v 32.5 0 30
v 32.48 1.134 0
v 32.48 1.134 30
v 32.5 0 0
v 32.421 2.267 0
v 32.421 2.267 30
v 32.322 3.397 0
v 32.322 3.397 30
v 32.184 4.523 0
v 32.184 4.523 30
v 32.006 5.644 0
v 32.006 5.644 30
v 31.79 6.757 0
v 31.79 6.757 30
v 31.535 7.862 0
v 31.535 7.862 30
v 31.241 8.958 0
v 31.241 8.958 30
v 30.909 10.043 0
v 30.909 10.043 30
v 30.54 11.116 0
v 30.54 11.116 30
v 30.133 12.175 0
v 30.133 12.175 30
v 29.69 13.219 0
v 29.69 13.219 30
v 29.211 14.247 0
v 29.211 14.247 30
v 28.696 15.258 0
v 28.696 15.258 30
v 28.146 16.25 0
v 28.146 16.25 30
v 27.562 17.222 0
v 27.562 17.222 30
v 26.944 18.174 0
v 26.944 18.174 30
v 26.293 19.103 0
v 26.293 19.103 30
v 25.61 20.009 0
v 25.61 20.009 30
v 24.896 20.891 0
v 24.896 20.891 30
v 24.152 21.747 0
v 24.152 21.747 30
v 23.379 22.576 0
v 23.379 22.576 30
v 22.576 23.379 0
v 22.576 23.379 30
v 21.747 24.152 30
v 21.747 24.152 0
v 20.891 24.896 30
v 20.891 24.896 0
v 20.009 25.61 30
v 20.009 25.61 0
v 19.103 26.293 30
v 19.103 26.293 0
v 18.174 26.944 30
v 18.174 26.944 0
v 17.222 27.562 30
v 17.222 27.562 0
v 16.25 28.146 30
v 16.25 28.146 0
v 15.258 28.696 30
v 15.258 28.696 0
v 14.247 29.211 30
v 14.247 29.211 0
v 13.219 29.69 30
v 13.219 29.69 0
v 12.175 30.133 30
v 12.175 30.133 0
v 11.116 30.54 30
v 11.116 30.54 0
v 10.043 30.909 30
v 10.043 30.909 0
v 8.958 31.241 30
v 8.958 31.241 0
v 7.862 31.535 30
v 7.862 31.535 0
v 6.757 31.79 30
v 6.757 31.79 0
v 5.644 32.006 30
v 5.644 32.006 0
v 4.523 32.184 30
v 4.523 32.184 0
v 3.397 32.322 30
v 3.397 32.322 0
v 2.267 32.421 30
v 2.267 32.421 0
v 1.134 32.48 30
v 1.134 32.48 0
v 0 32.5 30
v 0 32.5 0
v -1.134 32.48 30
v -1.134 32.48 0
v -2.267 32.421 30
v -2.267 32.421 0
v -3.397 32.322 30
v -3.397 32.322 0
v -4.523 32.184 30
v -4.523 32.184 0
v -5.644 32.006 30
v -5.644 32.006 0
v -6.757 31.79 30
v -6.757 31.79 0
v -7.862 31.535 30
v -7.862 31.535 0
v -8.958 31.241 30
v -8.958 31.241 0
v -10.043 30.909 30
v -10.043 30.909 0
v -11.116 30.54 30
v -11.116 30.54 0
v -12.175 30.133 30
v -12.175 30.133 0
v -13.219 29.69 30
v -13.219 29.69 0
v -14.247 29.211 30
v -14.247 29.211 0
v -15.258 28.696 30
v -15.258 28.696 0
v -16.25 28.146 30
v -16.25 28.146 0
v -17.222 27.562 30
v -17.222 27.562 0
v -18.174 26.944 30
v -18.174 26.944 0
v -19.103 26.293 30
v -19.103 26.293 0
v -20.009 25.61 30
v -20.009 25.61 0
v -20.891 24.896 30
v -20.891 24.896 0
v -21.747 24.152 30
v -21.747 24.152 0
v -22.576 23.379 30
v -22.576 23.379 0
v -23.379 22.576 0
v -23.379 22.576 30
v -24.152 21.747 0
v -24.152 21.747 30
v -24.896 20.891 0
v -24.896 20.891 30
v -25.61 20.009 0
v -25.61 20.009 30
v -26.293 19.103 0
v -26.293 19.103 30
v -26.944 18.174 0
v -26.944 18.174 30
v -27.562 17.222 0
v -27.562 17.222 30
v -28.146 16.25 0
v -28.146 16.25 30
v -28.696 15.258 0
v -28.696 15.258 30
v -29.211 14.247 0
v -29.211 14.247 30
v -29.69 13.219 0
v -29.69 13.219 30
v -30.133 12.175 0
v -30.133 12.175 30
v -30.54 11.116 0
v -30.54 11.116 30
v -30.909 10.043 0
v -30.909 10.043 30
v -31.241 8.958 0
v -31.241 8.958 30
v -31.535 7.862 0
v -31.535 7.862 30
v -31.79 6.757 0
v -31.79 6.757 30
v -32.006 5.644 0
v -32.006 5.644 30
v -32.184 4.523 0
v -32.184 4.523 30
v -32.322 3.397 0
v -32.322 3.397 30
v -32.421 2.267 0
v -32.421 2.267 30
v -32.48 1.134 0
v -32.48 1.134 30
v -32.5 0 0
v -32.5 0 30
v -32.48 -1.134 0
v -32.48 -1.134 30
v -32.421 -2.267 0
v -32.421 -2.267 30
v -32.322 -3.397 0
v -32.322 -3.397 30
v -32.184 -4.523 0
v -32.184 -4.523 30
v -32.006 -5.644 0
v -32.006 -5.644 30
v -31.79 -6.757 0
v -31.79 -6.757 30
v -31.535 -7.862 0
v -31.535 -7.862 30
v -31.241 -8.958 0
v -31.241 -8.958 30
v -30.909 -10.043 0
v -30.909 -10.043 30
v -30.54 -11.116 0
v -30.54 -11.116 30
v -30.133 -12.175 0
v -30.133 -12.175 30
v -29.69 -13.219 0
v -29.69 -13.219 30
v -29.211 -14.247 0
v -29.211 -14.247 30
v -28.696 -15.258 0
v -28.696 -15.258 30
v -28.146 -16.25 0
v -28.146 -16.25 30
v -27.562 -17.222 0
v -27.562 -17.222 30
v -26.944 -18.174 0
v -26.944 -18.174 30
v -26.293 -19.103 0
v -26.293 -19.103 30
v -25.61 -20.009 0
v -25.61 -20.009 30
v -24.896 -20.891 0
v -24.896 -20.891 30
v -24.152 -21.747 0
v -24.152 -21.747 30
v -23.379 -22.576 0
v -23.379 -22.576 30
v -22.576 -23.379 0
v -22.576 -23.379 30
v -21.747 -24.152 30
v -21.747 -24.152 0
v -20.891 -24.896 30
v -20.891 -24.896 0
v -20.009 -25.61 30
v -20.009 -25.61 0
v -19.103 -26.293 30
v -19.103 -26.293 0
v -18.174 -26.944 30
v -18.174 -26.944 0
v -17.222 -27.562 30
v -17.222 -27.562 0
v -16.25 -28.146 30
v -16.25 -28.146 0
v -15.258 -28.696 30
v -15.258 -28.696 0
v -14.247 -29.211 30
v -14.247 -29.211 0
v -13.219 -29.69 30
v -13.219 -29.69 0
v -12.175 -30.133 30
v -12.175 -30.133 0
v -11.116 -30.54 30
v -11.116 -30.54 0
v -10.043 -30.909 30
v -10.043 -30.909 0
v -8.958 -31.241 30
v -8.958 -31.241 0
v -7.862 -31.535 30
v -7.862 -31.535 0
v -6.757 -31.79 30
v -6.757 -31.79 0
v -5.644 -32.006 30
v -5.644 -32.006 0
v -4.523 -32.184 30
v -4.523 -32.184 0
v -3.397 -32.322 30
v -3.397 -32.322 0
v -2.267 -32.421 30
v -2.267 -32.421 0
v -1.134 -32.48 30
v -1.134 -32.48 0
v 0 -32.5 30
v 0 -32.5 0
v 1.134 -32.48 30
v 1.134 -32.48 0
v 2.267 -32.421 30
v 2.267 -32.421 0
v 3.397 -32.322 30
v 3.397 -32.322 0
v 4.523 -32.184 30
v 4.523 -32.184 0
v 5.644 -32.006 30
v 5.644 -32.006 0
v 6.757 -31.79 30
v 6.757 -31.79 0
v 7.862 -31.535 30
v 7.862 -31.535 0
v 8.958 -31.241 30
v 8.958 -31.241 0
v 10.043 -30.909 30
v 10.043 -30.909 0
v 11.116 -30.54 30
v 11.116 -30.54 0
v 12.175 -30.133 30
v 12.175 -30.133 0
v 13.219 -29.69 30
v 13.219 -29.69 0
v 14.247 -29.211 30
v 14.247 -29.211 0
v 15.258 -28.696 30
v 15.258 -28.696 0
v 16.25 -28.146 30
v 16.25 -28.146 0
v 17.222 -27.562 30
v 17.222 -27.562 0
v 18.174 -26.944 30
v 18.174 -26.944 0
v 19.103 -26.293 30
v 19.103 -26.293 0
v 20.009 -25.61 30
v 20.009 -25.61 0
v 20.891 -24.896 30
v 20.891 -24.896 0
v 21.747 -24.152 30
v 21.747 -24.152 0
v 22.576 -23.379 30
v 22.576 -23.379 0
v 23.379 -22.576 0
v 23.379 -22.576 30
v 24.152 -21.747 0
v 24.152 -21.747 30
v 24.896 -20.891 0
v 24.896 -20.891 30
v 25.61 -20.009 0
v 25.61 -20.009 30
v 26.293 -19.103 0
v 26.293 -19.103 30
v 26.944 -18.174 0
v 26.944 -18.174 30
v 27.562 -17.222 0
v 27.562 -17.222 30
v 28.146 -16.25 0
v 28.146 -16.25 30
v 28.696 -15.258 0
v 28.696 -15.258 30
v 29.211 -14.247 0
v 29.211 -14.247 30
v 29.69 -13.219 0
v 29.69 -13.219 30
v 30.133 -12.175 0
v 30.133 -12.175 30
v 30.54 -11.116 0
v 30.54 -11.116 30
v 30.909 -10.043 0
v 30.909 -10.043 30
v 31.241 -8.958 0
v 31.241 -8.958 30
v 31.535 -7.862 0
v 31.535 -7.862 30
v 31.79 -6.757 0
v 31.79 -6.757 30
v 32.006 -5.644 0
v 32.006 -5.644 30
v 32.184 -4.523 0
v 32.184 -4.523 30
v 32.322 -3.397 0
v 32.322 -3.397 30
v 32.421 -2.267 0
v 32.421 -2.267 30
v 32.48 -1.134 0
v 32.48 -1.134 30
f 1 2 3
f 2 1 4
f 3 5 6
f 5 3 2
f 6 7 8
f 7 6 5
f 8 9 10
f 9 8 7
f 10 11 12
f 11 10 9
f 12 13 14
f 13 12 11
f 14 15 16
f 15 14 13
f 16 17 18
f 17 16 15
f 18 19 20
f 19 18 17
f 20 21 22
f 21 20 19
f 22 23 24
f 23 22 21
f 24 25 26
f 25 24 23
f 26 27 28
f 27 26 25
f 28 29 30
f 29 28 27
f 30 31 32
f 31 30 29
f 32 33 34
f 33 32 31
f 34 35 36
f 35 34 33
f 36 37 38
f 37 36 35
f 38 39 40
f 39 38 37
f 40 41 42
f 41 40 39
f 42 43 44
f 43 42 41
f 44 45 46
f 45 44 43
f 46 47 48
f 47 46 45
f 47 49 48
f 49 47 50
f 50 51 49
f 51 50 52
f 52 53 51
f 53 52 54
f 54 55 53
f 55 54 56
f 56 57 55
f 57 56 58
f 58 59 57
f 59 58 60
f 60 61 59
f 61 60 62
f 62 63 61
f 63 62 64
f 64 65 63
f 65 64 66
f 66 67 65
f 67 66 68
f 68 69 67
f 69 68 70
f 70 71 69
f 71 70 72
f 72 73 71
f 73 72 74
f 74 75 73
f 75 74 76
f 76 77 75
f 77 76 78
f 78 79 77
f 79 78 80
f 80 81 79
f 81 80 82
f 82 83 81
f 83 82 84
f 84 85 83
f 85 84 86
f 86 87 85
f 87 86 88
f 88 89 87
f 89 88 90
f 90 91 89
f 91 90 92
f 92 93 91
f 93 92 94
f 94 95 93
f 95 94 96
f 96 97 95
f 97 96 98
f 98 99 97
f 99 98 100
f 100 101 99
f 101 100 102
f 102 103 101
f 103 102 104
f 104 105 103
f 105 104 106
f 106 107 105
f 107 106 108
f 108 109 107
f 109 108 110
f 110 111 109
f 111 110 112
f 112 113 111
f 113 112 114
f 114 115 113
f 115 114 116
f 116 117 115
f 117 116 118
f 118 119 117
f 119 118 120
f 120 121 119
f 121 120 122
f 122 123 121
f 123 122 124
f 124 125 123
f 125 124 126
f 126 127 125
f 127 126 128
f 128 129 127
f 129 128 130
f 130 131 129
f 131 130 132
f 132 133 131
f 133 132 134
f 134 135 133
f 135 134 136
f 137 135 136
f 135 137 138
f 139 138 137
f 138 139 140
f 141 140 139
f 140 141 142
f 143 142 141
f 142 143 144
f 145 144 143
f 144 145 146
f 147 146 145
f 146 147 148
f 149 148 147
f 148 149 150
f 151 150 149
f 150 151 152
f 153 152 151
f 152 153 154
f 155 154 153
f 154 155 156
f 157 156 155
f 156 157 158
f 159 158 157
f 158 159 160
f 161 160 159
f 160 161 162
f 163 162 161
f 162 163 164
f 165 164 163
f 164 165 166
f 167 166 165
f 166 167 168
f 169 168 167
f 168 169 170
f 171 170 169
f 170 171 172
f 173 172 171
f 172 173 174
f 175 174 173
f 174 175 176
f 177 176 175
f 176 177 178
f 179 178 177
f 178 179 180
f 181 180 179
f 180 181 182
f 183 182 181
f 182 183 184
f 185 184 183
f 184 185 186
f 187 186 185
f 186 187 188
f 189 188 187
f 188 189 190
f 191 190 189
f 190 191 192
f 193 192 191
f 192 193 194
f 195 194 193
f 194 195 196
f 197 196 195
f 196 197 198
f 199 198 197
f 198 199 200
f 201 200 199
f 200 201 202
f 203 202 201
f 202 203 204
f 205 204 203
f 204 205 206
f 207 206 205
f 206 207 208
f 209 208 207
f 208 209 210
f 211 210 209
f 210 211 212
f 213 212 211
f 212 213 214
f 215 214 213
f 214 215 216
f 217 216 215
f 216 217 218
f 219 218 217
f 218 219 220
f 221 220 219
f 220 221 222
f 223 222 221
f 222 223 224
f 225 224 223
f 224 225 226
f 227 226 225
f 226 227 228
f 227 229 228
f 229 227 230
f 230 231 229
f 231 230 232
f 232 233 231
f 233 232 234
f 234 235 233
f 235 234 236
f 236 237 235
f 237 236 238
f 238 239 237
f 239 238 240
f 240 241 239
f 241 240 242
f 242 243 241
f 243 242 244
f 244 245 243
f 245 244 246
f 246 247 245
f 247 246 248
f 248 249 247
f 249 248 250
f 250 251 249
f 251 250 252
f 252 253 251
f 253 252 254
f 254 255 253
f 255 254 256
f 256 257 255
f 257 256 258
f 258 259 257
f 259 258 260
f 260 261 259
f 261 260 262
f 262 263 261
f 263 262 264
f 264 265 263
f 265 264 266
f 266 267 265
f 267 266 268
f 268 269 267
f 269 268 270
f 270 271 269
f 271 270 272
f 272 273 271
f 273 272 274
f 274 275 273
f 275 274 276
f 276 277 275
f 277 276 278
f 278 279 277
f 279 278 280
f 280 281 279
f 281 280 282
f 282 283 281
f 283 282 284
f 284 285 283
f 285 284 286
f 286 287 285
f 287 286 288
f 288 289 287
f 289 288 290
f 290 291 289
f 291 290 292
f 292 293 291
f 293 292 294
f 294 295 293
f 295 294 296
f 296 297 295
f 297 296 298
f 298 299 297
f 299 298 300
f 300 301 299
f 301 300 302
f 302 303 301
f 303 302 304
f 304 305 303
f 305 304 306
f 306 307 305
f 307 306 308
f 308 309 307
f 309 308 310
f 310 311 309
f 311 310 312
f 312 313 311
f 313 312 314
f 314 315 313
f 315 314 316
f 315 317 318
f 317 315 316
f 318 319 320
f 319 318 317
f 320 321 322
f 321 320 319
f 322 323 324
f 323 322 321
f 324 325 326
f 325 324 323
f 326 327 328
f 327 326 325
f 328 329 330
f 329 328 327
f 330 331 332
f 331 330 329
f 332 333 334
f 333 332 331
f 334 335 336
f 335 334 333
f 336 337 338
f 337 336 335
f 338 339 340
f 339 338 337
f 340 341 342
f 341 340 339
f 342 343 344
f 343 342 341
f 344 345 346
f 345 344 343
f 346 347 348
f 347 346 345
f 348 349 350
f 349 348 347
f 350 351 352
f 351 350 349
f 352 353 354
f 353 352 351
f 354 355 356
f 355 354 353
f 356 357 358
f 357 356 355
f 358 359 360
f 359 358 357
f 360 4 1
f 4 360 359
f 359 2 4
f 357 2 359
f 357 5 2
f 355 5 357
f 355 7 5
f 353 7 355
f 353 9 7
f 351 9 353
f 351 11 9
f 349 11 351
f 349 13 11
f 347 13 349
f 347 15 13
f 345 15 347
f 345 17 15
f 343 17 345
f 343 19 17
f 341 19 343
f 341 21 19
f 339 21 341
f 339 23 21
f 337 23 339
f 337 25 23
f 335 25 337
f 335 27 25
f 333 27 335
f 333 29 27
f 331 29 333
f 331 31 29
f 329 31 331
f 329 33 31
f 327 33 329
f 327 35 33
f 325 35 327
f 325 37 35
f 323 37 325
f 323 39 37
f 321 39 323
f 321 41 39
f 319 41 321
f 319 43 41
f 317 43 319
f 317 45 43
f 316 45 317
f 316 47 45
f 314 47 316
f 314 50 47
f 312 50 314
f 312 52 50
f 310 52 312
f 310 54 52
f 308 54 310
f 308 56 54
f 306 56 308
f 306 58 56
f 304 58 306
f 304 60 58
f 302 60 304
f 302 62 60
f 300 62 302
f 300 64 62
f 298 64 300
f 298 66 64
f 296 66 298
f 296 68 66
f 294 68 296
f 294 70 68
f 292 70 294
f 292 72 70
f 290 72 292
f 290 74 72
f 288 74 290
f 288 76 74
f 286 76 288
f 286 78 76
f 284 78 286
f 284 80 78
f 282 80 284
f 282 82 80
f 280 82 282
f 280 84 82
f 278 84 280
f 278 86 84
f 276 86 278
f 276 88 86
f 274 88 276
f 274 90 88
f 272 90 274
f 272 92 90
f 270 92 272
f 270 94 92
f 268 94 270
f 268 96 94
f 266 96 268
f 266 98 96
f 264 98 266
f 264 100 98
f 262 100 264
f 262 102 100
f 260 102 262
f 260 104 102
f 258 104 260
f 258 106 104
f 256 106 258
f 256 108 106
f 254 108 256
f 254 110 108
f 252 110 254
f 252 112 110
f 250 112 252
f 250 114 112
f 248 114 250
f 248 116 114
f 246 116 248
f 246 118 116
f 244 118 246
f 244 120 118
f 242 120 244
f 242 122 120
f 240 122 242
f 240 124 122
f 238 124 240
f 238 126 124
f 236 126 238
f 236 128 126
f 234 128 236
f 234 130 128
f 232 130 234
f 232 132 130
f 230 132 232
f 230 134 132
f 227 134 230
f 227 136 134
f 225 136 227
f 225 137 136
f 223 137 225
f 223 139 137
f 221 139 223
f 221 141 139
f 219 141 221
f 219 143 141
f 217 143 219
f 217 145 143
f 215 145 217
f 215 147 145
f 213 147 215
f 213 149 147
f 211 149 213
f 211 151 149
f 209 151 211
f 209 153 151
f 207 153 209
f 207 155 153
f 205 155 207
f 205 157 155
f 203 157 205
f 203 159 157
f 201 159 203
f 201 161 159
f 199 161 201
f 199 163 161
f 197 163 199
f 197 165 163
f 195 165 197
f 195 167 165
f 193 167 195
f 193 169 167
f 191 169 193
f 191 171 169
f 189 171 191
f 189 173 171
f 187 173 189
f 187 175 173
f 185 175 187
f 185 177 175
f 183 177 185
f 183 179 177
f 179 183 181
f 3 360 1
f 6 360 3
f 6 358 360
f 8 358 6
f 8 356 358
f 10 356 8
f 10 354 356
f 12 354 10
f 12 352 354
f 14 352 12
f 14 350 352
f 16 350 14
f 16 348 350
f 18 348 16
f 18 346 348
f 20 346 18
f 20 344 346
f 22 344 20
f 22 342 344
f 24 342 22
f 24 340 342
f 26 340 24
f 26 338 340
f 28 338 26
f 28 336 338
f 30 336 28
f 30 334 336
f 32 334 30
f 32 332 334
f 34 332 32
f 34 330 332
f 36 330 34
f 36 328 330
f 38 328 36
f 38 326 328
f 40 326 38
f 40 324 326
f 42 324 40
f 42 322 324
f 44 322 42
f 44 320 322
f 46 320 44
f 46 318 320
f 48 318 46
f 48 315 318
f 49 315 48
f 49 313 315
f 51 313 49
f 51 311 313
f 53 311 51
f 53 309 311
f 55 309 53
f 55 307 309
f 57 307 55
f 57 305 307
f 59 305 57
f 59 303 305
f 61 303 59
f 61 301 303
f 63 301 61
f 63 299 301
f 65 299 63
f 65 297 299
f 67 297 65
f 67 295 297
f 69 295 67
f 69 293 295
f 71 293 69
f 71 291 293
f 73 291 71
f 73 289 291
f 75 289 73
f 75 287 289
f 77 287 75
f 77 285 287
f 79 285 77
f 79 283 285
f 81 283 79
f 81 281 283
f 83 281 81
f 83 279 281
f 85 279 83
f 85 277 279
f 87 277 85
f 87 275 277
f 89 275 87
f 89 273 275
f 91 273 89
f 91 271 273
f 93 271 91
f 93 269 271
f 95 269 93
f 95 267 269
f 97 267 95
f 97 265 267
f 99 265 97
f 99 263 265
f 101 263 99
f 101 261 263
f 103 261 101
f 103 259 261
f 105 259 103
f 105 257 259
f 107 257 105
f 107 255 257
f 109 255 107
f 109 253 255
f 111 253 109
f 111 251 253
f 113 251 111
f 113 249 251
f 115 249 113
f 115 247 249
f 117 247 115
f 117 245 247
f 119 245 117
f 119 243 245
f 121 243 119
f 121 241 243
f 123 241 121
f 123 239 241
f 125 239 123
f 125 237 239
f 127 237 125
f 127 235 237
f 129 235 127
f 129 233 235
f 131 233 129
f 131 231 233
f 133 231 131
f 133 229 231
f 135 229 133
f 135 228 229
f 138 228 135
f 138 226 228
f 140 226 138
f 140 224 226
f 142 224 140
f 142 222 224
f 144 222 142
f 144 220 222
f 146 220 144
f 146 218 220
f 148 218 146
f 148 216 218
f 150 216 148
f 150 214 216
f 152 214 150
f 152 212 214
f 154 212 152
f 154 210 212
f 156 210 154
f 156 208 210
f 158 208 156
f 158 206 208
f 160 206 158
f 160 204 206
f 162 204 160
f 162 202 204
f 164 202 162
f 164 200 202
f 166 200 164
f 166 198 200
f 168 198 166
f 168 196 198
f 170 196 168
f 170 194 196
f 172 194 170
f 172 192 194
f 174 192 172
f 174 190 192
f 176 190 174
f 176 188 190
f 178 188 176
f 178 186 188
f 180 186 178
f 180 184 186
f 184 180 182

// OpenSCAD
// Cup riser for the Science Olympiad Thermodynamics collector.
// Fits on the 72 mm cup platform in ThermoDynamicsHeatCollectionBowl.scad.

riser_diameter = 65;
riser_height = 30;

$fn = 180;

cylinder(
    h = riser_height,
    d = riser_diameter
);

echo(str("Cup riser diameter: ", riser_diameter, " mm"));
echo(str("Cup riser height: ", riser_height, " mm"));
